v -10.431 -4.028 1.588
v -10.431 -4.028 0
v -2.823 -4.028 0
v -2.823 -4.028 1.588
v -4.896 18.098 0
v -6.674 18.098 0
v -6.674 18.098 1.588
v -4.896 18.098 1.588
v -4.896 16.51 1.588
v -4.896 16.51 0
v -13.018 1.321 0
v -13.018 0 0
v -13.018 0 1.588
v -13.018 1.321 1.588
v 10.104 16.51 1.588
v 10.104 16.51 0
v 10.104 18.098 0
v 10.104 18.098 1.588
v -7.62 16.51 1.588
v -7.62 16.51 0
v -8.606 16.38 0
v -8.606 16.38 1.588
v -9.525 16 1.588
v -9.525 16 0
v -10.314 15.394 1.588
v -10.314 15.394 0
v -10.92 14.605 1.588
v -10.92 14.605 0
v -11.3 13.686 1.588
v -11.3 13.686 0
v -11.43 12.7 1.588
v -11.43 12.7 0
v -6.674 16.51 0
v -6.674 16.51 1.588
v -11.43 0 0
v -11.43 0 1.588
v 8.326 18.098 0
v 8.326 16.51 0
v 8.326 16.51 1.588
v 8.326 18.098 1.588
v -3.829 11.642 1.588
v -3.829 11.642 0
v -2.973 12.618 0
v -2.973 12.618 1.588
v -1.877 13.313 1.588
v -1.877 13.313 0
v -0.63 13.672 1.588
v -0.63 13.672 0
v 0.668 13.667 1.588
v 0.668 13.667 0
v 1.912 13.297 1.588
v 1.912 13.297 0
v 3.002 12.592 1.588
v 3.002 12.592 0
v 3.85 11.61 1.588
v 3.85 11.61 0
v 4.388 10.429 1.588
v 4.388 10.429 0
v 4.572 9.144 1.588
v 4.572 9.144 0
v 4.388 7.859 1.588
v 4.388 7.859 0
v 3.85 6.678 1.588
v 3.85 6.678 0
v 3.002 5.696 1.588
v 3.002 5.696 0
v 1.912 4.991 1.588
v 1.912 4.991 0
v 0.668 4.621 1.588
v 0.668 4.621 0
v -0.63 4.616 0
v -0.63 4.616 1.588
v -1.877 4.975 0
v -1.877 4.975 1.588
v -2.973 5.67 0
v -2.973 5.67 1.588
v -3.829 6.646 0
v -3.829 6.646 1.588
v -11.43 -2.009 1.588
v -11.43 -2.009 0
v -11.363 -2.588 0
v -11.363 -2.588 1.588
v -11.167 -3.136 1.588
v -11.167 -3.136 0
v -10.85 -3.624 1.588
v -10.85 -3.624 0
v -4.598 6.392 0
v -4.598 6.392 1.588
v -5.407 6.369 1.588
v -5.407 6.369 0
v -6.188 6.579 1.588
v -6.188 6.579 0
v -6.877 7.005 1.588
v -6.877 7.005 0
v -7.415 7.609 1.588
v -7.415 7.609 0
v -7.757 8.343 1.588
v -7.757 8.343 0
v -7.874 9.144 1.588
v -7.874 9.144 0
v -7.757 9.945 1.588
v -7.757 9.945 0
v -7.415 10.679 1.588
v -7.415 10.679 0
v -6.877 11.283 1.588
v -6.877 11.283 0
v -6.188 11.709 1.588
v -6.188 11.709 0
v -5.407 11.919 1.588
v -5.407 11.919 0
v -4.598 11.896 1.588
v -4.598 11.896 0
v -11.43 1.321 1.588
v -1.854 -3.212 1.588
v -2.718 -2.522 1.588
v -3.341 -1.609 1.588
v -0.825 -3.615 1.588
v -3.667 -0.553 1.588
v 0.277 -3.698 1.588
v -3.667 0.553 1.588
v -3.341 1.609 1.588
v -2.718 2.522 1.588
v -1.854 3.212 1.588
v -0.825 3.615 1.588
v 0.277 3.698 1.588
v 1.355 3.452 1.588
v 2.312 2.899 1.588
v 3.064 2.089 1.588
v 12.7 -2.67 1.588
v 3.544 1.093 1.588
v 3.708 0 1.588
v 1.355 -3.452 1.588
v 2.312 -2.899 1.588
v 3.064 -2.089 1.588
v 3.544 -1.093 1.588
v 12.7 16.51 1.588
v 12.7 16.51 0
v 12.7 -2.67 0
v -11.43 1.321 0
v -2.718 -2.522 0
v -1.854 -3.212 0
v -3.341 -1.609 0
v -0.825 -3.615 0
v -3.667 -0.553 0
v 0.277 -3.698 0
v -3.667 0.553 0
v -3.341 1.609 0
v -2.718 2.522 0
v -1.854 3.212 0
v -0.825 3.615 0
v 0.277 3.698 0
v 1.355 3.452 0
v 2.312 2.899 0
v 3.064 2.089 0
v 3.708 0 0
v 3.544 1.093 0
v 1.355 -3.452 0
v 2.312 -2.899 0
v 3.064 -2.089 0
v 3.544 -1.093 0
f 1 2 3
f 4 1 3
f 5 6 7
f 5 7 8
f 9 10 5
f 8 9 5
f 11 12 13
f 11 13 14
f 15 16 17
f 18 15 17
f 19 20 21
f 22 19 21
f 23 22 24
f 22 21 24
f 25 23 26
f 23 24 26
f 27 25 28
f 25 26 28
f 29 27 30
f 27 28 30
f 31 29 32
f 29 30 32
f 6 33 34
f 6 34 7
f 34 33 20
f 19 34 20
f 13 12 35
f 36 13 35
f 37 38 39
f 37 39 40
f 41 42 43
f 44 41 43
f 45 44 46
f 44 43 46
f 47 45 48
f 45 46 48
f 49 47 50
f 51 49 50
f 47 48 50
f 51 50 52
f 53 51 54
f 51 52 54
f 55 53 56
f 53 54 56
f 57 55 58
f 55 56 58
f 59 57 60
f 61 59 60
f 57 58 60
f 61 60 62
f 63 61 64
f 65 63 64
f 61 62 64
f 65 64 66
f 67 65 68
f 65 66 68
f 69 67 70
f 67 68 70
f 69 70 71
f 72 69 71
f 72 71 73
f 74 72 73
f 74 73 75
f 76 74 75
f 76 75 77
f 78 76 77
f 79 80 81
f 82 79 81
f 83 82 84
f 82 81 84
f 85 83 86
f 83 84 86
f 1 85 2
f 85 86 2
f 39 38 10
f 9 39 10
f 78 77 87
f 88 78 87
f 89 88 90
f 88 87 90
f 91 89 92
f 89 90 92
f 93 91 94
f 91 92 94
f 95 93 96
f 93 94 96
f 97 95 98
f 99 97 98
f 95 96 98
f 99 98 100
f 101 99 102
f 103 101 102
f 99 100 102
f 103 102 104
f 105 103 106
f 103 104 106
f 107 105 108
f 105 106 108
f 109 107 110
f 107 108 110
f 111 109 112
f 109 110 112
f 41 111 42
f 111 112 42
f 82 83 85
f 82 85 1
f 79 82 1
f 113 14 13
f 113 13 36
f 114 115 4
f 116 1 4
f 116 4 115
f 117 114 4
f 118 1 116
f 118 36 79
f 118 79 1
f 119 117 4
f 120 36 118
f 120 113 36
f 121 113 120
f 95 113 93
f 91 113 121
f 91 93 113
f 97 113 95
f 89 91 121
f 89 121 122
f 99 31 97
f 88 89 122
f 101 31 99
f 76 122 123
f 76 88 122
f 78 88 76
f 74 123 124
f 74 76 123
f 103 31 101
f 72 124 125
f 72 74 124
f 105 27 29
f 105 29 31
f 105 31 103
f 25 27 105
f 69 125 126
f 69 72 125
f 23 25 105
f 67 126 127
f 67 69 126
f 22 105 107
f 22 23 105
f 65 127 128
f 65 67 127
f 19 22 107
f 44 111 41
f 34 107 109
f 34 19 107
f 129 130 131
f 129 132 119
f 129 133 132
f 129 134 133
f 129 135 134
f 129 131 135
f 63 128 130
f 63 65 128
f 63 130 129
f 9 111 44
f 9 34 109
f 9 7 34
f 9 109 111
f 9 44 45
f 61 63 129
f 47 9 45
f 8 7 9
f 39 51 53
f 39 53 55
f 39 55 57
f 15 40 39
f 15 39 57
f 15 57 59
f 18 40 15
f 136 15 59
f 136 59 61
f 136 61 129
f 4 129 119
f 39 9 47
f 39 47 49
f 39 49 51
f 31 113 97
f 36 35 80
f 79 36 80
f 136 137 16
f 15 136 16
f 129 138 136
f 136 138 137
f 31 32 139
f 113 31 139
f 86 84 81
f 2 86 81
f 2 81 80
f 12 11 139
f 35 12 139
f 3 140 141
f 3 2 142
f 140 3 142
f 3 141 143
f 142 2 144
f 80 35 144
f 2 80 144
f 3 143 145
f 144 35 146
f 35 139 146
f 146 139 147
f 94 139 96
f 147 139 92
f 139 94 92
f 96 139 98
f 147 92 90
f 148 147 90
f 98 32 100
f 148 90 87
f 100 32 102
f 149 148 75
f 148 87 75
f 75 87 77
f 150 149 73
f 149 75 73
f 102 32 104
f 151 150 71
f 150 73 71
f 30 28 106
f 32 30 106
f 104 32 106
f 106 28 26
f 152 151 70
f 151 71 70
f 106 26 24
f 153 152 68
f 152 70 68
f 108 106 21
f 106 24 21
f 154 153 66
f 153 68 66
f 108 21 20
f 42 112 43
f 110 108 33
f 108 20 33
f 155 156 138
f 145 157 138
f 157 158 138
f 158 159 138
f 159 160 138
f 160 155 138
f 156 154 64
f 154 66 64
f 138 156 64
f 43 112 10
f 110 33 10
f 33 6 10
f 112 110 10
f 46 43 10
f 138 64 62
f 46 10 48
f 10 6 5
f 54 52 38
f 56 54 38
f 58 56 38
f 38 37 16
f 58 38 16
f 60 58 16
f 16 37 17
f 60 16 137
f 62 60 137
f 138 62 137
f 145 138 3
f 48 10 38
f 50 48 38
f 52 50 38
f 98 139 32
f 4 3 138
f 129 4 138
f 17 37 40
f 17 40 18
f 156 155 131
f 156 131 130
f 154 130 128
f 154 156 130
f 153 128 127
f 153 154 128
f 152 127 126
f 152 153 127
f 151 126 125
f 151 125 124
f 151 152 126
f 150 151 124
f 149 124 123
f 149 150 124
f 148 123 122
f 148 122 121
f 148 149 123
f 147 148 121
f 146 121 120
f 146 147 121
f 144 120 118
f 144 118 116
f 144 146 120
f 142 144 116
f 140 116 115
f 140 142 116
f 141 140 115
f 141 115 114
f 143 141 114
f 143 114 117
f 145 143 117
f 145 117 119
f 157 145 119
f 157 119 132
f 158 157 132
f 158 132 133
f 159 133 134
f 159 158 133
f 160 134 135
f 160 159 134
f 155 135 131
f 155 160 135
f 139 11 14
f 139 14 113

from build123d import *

# Parameters (mm, degrees)
SKETCH1_R           = 3.7084
SKETCH1_W           = 1.778
SKETCH1_H           = 1.5875
SKETCH1_W_2         = 1.5875
SKETCH1_H_2         = 1.3208
BOSS_EXTRUDE1_DEPTH = 1.5875


with BuildPart() as part:
    # Sketch1 → Boss-Extrude1 (new body)
    # profile 1 of 4: a face of its own
    with BuildSketch(Plane.XY):
        with BuildLine():
            Line((-10.431265191, -4.028360607), (-2.823309713, -4.028360607))
            Line((-2.823309713, -4.028360607), (12.7, -2.670246987))
            Line((12.7, -2.670246987), (12.7, 16.51))
            Line((12.7, 16.51), (10.10362126, 16.51))
            Line((10.10362126, 16.51), (8.32562126, 16.51))
            Line((8.32562126, 16.51), (-4.89637874, 16.51))
            Line((-4.89637874, 16.51), (-6.67437874, 16.51))
            Line((-6.67437874, 16.51), (-7.62, 16.51))
            ThreePointArc((-7.62, 16.51), (-10.314076836, 15.394076836), (-11.43, 12.7))
            Line((-11.43, 12.7), (-11.43, 1.3208))
            Line((-11.43, 1.3208), (-11.43, 0))
            Line((-11.43, 0), (-11.43, -2.009424845))
            ThreePointArc((-11.43, -2.009424845), (-11.166665718, -3.135654487), (-10.431265191, -4.028360607))
        make_face()
        Circle(SKETCH1_R, mode=Mode.SUBTRACT)
        with BuildLine():
            ThreePointArc((-3.82905, 11.642311449), (4.572, 9.144), (-3.82905, 6.645688551))
            ThreePointArc((-3.82905, 6.645688551), (-7.874, 9.144), (-3.82905, 11.642311449))
        make_face(mode=Mode.SUBTRACT)
    # profile 2 of 4: a face of its own
    with BuildSketch(Plane.XY):
        with Locations((-5.78537874, 17.30375)):
            Rectangle(SKETCH1_W, SKETCH1_H)
    # profile 3 of 4: a face of its own
    with BuildSketch(Plane.XY):
        with Locations((9.21462126, 17.30375)):
            Rectangle(SKETCH1_W, SKETCH1_H)
    # profile 4 of 4: a face of its own
    with BuildSketch(Plane.XY):
        with Locations((-12.22375, 0.6604)):
            Rectangle(SKETCH1_W_2, SKETCH1_H_2)
    extrude(amount=BOSS_EXTRUDE1_DEPTH)


solid = part.part
